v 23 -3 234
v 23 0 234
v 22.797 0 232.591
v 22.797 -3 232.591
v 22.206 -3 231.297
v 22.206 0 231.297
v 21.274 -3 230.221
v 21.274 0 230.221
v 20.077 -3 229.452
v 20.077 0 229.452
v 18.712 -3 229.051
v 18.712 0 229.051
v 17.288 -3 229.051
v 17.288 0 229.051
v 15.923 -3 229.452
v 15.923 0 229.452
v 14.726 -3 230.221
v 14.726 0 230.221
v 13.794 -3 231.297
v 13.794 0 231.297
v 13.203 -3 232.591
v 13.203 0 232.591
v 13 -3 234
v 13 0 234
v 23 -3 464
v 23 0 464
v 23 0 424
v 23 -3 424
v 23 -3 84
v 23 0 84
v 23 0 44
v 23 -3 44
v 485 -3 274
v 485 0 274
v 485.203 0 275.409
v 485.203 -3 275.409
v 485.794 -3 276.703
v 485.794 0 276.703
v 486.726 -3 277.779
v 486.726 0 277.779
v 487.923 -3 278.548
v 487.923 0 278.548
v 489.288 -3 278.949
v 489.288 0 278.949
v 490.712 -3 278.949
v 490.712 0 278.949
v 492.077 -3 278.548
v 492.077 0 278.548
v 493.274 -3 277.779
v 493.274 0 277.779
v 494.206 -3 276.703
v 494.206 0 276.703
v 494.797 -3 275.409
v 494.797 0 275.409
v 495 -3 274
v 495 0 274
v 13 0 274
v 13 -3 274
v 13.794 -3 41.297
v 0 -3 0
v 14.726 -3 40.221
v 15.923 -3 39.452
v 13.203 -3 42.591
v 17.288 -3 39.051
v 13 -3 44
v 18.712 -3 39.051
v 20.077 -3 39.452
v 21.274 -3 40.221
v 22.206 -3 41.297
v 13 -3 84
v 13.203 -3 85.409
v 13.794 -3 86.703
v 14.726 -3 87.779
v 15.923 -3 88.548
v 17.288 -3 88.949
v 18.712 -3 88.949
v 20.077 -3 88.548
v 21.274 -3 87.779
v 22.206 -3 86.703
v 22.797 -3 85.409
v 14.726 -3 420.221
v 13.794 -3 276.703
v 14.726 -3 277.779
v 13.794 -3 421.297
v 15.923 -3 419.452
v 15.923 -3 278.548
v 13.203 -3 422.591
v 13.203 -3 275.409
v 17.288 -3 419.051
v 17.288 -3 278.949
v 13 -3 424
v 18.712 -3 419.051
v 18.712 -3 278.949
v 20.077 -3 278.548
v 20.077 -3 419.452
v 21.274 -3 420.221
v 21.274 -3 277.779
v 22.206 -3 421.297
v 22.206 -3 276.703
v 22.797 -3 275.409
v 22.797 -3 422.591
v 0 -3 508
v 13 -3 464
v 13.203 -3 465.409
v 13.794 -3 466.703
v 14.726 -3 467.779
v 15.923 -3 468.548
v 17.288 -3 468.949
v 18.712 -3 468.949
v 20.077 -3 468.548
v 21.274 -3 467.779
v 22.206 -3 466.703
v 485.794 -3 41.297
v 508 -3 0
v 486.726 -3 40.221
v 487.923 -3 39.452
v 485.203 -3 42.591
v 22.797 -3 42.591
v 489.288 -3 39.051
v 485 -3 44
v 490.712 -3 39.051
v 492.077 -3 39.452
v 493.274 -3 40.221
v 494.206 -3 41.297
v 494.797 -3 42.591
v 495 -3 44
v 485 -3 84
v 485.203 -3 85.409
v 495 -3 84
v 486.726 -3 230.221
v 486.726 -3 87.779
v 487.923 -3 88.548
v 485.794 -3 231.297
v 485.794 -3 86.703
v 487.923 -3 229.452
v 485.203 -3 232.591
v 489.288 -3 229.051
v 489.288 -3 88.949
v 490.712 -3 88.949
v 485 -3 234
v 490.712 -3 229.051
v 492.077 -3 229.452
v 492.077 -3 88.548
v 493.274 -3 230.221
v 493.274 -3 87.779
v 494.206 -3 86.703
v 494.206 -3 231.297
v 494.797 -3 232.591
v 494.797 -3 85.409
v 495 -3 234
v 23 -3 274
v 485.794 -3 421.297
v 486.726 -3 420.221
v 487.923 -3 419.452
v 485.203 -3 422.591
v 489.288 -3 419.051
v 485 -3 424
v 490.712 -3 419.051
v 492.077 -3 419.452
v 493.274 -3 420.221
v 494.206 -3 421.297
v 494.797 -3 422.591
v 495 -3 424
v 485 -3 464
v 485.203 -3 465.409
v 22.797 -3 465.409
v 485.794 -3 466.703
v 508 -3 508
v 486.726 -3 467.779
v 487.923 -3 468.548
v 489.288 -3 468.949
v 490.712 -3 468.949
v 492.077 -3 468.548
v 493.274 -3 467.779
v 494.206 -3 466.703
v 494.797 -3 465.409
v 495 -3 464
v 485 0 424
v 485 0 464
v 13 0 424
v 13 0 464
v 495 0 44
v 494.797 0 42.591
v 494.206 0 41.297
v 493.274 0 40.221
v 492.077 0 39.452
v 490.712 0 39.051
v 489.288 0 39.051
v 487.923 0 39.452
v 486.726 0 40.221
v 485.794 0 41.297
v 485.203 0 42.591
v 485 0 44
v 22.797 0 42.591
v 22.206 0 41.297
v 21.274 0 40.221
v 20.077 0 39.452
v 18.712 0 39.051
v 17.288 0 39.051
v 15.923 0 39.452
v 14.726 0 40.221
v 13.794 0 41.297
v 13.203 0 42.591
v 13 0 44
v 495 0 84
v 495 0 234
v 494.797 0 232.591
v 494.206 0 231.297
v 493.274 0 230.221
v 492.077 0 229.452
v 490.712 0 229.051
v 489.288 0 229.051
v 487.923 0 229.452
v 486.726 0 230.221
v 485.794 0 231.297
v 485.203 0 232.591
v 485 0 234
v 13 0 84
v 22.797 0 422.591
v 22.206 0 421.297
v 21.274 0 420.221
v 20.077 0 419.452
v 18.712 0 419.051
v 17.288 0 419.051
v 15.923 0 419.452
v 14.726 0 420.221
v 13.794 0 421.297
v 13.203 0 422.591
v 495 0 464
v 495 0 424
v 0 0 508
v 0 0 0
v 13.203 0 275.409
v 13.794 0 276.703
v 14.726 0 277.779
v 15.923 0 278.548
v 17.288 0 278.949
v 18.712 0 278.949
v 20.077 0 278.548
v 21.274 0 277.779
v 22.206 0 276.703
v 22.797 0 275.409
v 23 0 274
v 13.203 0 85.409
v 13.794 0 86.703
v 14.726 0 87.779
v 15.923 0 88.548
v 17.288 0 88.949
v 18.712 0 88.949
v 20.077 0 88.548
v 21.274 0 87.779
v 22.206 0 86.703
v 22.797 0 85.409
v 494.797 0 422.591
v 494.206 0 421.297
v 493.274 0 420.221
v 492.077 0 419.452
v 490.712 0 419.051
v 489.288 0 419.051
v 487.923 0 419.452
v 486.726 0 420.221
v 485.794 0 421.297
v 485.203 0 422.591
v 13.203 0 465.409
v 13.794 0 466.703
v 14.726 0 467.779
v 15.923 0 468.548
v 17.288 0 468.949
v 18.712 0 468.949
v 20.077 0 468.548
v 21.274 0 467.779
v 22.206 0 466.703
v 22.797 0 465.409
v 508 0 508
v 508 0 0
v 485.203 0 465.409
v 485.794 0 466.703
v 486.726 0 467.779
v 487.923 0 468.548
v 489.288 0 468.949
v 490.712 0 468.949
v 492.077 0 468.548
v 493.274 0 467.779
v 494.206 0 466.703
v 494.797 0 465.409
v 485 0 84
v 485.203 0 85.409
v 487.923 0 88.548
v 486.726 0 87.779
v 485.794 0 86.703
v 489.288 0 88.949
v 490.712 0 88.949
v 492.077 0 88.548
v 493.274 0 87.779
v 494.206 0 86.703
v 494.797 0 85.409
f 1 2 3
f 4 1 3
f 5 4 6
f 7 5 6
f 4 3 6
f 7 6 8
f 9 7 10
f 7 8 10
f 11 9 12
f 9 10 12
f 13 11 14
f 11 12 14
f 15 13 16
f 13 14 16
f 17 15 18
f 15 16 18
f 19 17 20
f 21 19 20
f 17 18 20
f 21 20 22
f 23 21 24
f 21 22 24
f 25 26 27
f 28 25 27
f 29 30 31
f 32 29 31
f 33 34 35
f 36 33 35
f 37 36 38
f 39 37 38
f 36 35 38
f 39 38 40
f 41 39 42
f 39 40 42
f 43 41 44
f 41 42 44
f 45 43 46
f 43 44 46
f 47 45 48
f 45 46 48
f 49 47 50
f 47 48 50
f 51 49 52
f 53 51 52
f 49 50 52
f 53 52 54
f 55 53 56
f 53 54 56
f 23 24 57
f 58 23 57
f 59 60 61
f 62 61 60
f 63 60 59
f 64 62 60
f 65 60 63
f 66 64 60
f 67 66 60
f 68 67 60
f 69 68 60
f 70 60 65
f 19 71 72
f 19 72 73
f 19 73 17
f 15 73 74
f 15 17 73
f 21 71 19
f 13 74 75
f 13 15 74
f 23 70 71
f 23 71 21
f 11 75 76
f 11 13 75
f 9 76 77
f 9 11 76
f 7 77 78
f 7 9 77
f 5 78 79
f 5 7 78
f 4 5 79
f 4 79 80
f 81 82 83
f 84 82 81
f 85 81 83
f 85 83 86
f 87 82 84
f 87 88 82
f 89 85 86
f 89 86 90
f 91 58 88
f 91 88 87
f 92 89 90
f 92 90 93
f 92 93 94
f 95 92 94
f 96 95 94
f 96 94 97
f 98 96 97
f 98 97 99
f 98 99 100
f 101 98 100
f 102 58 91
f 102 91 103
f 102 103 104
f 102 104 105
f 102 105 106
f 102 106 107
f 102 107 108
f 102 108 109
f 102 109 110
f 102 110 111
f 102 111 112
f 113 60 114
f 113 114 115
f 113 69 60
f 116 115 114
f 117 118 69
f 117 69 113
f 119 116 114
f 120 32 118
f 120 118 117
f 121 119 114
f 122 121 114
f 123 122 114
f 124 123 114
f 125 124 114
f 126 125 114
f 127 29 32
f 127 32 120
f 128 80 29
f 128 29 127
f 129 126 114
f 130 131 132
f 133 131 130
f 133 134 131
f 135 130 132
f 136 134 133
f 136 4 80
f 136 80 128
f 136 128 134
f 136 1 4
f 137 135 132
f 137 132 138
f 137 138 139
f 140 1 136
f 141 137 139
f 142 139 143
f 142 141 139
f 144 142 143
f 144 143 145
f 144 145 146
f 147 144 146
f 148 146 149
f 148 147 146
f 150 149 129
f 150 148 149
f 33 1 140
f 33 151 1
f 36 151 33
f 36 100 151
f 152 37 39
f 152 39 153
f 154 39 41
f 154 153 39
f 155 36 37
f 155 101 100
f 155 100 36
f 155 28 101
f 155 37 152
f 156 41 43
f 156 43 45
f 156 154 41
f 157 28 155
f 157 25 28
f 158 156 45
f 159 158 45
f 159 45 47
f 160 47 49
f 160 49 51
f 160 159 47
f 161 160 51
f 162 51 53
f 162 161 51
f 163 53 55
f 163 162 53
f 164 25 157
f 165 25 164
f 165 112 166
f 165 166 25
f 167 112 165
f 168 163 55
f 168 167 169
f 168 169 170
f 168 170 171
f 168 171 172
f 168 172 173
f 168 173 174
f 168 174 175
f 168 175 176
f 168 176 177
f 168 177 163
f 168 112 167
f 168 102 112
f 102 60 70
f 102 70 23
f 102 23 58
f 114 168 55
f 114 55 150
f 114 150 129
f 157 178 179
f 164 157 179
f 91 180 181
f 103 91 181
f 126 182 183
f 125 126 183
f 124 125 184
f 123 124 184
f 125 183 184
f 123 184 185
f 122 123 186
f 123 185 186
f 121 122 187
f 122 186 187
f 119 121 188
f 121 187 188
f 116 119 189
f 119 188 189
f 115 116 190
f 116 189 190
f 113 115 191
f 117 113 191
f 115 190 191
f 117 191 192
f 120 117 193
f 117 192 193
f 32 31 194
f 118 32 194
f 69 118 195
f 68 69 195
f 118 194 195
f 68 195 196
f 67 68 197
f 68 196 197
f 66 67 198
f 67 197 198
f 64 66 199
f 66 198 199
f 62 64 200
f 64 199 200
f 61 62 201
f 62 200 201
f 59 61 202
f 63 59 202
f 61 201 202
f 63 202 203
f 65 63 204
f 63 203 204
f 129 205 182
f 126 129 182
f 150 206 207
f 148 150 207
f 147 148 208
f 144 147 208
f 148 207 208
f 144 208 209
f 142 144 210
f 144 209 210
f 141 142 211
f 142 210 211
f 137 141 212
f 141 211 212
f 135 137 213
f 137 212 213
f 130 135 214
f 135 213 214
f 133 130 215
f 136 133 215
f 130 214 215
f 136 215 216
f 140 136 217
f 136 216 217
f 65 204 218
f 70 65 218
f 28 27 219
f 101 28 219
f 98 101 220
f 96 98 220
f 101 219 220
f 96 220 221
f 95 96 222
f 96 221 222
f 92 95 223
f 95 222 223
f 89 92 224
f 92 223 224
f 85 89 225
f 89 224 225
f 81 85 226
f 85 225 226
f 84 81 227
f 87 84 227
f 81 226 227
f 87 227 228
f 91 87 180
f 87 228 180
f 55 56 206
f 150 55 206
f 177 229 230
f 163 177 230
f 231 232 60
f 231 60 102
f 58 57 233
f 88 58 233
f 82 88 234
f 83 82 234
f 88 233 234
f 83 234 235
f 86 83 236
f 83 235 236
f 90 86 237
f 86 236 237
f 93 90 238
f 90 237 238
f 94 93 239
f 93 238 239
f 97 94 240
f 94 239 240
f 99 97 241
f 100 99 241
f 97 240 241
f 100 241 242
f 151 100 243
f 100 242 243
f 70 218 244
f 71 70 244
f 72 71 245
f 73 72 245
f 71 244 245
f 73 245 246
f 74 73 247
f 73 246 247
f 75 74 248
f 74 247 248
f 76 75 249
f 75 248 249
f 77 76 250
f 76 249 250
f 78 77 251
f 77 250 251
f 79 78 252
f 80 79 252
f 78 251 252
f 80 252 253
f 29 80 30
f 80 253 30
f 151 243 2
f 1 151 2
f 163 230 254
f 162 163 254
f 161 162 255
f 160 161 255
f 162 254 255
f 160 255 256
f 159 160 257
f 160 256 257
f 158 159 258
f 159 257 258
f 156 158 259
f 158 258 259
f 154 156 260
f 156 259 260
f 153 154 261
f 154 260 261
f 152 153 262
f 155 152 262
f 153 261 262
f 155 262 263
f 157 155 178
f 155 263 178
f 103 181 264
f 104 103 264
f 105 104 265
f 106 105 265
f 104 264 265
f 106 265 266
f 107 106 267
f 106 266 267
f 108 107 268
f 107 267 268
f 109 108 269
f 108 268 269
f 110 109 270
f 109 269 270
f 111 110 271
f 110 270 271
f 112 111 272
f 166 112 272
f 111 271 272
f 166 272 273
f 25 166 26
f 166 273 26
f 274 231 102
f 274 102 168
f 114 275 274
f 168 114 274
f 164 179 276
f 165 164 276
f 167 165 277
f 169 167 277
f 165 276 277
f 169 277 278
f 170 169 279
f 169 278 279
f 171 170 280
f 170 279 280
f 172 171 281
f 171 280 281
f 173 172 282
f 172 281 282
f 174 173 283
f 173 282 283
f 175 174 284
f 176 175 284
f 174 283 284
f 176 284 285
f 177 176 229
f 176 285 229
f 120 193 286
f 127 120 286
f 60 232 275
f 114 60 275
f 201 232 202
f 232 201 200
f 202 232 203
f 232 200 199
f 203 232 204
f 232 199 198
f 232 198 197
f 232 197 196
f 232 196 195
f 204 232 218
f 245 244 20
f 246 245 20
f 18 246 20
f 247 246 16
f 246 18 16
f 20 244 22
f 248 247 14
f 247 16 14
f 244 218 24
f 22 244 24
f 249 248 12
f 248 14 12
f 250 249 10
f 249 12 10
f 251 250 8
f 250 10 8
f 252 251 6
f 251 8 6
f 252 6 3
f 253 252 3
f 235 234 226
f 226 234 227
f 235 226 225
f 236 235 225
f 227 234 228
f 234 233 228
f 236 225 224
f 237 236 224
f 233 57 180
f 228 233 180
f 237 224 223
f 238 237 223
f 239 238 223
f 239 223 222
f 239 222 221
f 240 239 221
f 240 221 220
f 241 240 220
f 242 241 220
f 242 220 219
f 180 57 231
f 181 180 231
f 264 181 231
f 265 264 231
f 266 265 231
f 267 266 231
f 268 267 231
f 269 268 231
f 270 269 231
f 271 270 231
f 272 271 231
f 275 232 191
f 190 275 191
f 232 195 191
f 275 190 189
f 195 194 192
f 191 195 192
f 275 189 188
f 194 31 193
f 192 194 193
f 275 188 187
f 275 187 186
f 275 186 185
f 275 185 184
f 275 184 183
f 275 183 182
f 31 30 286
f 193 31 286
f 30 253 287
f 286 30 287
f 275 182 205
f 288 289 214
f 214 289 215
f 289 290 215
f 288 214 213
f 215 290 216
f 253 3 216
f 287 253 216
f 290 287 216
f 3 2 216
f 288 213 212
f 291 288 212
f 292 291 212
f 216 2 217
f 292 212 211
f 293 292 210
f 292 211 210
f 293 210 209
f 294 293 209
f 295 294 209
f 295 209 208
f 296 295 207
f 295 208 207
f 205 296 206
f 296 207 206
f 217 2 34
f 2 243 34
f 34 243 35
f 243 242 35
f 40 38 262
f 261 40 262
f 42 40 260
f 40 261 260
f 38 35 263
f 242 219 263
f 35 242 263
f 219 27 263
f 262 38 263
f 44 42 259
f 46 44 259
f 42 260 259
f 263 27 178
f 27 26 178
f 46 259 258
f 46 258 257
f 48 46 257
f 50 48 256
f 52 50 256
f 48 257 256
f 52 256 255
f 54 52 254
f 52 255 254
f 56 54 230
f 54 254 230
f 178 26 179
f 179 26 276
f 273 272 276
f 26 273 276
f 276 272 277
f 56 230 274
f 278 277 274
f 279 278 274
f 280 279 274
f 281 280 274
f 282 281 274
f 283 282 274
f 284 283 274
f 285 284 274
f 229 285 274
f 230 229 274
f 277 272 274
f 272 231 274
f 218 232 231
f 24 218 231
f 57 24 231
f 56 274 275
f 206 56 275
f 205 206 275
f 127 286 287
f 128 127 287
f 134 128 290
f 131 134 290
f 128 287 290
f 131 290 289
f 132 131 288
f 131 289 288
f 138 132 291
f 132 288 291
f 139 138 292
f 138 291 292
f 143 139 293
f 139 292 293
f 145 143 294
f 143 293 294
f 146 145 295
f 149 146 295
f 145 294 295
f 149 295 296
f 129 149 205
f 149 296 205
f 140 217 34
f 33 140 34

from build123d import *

# Parameters (mm, degrees)
F0_W     = 508
F0_H     = 508
F1_DEPTH = 3


with BuildPart() as f1:
    # F0 (on Front) → F1 (new body)
    with BuildSketch(Plane.XZ):
        with Locations((254, 254)):
            Rectangle(F0_W, F0_H)
        with BuildLine():
            ThreePointArc((13, 84), (18, 89), (23, 84))
            Line((23, 84), (23, 44))
            ThreePointArc((23, 44), (18, 39), (13, 44))
            Line((13, 44), (13, 84))
        make_face(mode=Mode.SUBTRACT)
        with BuildLine():
            ThreePointArc((495, 44), (490, 39), (485, 44))
            Line((485, 44), (485, 84))
            ThreePointArc((485, 84), (490, 89), (495, 84))
            Line((495, 84), (495, 44))
        make_face(mode=Mode.SUBTRACT)
        with BuildLine():
            ThreePointArc((13, 274), (18, 279), (23, 274))
            Line((23, 274), (23, 234))
            ThreePointArc((23, 234), (18, 229), (13, 234))
            Line((13, 234), (13, 274))
        make_face(mode=Mode.SUBTRACT)
        with BuildLine():
            ThreePointArc((13, 464), (18, 469), (23, 464))
            Line((23, 464), (23, 424))
            ThreePointArc((23, 424), (18, 419), (13, 424))
            Line((13, 424), (13, 464))
        make_face(mode=Mode.SUBTRACT)
        with BuildLine():
            ThreePointArc((485, 274), (490, 279), (495, 274))
            Line((495, 274), (495, 234))
            ThreePointArc((495, 234), (490, 229), (485, 234))
            Line((485, 234), (485, 274))
        make_face(mode=Mode.SUBTRACT)
        with BuildLine():
            ThreePointArc((485, 464), (490, 469), (495, 464))
            Line((495, 464), (495, 424))
            ThreePointArc((495, 424), (490, 419), (485, 424))
            Line((485, 424), (485, 464))
        make_face(mode=Mode.SUBTRACT)
    extrude(amount=F1_DEPTH)


solid = f1.part
